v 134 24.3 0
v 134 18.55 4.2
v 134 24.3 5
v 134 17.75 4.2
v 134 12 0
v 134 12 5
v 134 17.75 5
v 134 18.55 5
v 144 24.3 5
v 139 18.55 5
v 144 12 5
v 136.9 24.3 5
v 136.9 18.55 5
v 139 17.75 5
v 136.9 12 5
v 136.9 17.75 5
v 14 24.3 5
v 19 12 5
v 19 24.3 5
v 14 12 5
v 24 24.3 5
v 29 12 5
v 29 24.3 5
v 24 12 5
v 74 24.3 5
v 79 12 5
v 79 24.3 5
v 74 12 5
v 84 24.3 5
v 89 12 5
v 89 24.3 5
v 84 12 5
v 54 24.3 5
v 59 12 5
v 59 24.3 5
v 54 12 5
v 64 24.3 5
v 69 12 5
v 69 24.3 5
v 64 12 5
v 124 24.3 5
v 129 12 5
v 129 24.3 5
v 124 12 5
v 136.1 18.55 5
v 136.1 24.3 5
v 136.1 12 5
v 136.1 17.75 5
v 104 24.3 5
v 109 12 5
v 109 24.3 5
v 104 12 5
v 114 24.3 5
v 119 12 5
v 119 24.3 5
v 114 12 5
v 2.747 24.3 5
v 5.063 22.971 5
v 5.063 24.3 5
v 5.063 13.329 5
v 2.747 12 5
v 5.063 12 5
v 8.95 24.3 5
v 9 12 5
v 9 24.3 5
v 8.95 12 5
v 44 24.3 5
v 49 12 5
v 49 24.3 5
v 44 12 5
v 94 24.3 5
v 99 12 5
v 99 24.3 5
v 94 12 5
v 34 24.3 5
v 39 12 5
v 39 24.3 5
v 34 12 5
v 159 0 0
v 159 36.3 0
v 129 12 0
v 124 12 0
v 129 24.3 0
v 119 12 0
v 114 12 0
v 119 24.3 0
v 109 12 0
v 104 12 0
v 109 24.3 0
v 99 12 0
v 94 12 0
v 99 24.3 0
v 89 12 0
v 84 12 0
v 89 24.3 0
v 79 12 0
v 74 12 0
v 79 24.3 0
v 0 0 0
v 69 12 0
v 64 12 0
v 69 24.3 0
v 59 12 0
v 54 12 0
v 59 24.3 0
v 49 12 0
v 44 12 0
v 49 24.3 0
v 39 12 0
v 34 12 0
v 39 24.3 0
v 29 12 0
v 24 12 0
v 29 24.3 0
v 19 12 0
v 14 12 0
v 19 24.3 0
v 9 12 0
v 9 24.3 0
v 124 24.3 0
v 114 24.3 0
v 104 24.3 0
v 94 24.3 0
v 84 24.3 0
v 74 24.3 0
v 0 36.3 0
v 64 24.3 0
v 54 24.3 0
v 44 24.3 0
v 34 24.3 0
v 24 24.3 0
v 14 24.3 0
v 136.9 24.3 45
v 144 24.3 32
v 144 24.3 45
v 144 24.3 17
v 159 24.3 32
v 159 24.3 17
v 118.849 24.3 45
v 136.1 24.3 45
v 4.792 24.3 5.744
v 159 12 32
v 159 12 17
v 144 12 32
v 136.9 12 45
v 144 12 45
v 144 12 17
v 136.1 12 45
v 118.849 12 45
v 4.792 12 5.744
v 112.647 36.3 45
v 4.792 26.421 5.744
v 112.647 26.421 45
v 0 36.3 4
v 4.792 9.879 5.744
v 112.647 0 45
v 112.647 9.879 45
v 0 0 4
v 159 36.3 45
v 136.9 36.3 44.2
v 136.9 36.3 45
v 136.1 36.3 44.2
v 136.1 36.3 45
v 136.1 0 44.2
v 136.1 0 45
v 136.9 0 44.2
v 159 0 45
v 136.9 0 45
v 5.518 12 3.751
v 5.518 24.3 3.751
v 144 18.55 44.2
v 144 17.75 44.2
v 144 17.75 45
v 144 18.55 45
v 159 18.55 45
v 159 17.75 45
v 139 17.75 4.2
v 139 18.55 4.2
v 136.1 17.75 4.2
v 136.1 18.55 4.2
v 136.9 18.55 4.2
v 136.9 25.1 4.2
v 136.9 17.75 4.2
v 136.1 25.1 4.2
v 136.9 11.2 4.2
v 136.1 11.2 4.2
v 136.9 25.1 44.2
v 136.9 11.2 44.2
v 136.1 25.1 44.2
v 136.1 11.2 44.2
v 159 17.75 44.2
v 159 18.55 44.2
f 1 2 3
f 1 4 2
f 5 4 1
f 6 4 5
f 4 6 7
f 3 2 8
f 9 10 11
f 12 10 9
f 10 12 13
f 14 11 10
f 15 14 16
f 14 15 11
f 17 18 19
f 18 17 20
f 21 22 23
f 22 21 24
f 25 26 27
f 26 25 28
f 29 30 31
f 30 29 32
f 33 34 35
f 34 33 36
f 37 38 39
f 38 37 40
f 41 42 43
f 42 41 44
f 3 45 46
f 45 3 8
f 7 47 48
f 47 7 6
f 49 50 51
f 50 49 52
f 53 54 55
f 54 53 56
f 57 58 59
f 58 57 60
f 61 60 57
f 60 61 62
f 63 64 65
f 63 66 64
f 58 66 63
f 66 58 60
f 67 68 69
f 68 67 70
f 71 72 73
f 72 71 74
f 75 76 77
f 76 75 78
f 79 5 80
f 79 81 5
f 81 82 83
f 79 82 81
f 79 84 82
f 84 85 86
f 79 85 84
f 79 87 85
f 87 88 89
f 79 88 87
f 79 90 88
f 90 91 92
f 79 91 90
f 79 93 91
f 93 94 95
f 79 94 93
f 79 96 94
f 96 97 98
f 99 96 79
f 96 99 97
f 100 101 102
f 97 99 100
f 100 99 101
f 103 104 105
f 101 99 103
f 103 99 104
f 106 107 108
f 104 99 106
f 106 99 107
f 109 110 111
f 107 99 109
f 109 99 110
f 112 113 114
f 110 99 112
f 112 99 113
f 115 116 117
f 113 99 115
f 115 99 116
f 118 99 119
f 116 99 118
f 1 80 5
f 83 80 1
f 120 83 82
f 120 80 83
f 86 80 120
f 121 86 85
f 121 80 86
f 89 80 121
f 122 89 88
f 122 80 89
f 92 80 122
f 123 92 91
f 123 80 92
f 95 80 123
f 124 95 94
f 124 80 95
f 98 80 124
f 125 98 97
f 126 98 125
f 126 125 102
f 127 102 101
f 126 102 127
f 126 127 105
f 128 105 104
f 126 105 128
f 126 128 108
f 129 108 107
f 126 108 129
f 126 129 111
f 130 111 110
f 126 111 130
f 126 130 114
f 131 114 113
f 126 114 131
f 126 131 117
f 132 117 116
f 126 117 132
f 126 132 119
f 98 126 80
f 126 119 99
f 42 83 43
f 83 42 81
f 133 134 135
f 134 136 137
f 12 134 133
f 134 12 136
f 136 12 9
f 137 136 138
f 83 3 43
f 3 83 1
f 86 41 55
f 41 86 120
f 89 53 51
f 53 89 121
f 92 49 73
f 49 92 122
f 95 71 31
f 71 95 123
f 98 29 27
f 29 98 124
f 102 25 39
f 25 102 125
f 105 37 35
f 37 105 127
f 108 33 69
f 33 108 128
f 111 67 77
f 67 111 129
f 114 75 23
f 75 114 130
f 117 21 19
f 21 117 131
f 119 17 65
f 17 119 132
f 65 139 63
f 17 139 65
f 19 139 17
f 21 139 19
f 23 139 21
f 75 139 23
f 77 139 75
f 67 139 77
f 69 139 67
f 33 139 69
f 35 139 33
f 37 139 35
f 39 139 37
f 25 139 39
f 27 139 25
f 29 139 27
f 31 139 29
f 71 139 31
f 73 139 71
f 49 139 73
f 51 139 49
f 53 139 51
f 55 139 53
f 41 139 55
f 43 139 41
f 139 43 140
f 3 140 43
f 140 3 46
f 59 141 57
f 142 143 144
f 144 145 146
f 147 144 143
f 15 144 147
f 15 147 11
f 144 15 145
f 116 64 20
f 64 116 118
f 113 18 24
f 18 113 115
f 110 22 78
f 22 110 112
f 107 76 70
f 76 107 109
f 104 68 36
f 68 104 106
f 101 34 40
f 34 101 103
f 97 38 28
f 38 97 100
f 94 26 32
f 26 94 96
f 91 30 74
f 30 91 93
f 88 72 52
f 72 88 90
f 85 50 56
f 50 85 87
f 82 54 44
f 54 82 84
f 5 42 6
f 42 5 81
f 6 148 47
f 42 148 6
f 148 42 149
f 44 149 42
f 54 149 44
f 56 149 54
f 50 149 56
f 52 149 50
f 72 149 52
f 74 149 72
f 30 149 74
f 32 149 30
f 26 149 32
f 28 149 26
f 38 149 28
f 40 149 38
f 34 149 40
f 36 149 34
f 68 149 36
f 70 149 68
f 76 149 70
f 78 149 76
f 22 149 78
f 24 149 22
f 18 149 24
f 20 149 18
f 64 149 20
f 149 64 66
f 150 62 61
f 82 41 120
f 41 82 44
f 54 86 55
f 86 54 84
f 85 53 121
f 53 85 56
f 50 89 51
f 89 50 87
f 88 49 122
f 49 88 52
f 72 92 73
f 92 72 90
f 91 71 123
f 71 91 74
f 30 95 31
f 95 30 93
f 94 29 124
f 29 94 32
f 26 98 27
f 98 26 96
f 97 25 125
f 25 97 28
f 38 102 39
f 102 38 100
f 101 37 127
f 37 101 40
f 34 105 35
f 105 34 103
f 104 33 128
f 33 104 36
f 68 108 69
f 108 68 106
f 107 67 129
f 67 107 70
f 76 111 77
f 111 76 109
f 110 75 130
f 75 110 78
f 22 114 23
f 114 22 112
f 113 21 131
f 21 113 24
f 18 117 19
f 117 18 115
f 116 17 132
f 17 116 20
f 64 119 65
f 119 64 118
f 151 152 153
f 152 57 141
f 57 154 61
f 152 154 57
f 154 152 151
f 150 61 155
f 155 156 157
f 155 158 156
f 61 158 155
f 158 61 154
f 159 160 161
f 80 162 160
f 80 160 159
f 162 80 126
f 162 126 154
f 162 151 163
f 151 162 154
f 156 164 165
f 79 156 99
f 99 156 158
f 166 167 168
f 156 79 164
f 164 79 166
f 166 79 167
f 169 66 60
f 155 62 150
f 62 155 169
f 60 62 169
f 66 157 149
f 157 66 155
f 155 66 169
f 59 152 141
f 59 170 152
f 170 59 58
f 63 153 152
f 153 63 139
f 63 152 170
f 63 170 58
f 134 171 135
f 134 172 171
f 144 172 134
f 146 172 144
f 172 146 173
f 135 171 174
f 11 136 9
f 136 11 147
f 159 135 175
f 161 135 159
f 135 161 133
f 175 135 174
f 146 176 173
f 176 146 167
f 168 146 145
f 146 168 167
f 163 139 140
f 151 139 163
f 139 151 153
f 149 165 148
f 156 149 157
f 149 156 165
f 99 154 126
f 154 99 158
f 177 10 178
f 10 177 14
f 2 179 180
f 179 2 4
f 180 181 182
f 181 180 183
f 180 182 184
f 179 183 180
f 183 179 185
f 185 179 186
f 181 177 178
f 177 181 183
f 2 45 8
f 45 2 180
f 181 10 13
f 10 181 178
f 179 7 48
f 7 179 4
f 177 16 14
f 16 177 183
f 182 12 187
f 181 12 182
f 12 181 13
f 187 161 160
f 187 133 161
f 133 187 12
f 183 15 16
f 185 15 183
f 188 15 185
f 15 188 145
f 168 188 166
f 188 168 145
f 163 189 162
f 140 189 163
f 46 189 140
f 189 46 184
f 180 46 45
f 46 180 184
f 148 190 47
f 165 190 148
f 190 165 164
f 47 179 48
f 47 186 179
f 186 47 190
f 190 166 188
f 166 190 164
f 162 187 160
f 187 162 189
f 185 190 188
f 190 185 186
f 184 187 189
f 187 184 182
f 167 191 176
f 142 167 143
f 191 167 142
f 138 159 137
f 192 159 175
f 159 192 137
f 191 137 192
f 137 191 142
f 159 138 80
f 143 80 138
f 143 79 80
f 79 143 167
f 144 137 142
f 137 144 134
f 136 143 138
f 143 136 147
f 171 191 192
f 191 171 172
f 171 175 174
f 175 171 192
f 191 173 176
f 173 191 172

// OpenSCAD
// Copyright 2024 Martin Scheidt (Attribution 4.0 International, CC-BY 4.0)
//
// You are free to copy and redistribute the material in any medium or format.
// You are free to remix, transform, and build upon the material for any purpose, even commercially.
// You must give appropriate credit, provide a link to the license, and indicate if changes were made.
// You may not apply legal terms or technological measures that legally restrict others from doing anything the license permits.
// No warranties are given.

include<config.scad>

module diagonal_cutout(){
    translate([0,0,4])rotate([0,-20,0]) union(){
        cube([150, dsb_depth, 60]);
        // chamfer
        translate([155/2+2.6,dsc_y_pos,0])rotate([45,0,0])cube([150, 3, 3], center=true);
        translate([155/2+2.6,dsc_y_pos+dsc_depth,0])rotate([45,0,0])cube([150, 3, 3], center=true);
    }
}

module connector_space(){
difference(){
    cube([dsc_connector_width, dsb_depth, dsb_height]);
    translate([0,dsc_y_pos, dsc_connector_z_pos]) cube([dsc_connector_width,dsc_depth, dsc_connector_height]);
    translate([0, dsc_y_pos+(dsc_depth-thin_line)/2, dsb_height-thin_line]) cube([dsc_connector_width,thin_line,thin_line]);
}
}
module template_straight(){
difference(){
    cube([straight_length, dsb_depth, dsb_height]);
    //straight
    translate([0,dsc_y_pos,dsg_thickness]) cube([straight_length, dsc_depth, dsb_height]);
    // ground holes
    for (x=[straight_length-3*dsg_hole_depth : -10 : 5]){
        translate([x,dsc_y_pos,0]) cube([dsg_hole_depth,dsc_depth,dsg_thickness]);
    }
    diagonal_cutout();
   
    
    // hole position lines
    translate([straight_length-2*dsg_hole_depth, dsc_y_pos+(dsc_depth-thin_line)/2, dsg_thickness-thin_line]) cube([dsg_hole_depth,thin_line,thin_line]);
    translate([straight_length-dsh_x_pos-thin_line/2, dsc_y_pos, dsg_thickness-thin_line])cube([thin_line, dsc_depth, thin_line]);
    translate([straight_length-dsh_x_pos-thin_line/2, dsc_y_pos-dsc_depth, dsb_height-thin_line])cube([thin_line, dsc_depth, thin_line]);
    translate([straight_length-dsh_x_pos-thin_line/2, dsc_y_pos+dsc_depth, dsb_height-thin_line])cube([thin_line, dsc_depth, thin_line]);
    translate([straight_length-dsh_x_pos-thin_line/2, dsc_y_pos-thin_line, dsg_thickness-thin_line]) cube([thin_line, thin_line, dsb_height]);
    translate([straight_length-dsh_x_pos-thin_line/2, dsc_y_pos+dsc_depth, dsg_thickness-thin_line]) cube([thin_line, thin_line, dsb_height]);
    
}
//connector
translate([straight_length,0, 0]) connector_space();
//translate([-dsc_supporting_surface_width, dsc_y_pos, 0]) cube([dsc_supporting_surface_width, rail_height+move_tolerance, dsg_thickness]);
}

module test_print(){
    difference(){
        template_straight();
        cube([straight_length-30,50,50]);
    }
}

template_straight();
//diagonal_cutout();
//connector_space();
//test_print();
